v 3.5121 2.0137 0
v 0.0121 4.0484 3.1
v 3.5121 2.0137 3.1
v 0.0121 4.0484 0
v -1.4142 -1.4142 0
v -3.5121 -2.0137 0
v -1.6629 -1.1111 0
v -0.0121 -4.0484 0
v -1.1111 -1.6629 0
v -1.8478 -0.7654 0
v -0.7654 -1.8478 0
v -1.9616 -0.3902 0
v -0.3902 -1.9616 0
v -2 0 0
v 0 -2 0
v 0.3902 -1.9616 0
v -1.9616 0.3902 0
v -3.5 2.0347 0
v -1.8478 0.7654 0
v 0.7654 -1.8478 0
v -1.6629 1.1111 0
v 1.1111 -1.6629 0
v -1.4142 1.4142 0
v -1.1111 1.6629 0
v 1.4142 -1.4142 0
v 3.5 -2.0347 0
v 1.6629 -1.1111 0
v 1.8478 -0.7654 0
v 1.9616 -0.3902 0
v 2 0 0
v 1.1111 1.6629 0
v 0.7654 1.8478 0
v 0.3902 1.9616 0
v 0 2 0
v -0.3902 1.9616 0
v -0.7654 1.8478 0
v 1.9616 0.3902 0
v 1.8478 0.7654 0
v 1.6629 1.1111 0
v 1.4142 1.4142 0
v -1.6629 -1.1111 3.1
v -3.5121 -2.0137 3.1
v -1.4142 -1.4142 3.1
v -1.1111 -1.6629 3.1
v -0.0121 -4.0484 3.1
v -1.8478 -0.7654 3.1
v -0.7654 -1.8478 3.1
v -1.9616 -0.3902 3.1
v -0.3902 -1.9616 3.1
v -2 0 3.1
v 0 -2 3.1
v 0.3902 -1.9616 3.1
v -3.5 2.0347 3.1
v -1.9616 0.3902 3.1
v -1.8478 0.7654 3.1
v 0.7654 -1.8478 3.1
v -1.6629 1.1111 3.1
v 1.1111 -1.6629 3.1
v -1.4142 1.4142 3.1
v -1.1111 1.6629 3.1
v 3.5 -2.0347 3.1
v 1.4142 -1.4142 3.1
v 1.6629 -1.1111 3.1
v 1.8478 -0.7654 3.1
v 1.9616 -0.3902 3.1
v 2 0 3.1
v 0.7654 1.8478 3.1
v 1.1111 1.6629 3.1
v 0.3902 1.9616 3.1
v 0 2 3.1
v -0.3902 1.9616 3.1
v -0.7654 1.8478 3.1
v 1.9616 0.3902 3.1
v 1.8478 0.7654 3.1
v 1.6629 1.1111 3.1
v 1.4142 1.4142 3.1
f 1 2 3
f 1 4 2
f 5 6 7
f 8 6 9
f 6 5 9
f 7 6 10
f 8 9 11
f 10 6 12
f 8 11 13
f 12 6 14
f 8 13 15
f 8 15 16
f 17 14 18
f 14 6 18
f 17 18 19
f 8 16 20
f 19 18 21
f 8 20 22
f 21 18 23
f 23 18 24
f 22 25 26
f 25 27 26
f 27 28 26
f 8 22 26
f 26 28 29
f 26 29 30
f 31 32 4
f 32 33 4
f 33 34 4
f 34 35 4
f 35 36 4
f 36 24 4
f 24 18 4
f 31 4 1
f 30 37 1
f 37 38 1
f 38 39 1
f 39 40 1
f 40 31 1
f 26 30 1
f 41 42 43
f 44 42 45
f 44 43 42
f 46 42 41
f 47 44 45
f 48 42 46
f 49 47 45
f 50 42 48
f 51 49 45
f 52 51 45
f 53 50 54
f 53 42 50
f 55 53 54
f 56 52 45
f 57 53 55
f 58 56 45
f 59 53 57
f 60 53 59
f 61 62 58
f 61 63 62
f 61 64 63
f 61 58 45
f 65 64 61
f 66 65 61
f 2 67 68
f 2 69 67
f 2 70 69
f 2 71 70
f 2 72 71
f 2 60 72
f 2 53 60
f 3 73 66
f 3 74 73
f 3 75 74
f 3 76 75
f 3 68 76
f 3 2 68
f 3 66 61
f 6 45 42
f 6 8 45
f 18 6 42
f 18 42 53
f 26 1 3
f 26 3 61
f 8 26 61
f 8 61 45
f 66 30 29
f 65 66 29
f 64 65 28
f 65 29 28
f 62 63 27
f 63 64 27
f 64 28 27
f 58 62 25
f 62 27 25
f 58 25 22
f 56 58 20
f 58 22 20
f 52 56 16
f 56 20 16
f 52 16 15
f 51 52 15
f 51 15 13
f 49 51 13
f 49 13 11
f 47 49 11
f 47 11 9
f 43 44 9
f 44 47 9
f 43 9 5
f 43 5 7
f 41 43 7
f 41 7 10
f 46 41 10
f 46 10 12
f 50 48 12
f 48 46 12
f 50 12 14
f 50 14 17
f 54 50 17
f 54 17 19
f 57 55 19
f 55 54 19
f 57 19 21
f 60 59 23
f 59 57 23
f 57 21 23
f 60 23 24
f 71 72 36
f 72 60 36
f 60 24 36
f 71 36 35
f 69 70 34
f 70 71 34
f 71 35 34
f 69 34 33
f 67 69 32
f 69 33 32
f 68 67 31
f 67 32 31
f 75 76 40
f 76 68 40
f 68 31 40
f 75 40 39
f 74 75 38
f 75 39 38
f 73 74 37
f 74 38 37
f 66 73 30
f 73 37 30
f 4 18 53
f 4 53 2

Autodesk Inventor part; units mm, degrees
ref_plane "YZ Plane" through (0, 0, 0) normal (1, 0, 0) x (0, 1, 0)
ref_plane "XZ Plane" through (0, 0, 0) normal (0, 1, 0) x (-1, 0, 0)
ref_plane "XY Plane" through (0, 0, 0) normal (0, 0, 1) x (1, 0, 0)
sketch "Sketch1" plane through (0, 0, 0) normal (0, 0, 1) x (1, 0, 0)
  line L0 (3.5, -2.0347) -> (-0.0121, -4.0484)
  line L1 (-0.0121, -4.0484) -> (-3.5121, -2.0137)
  line L2 (-3.5121, -2.0137) -> (-3.5, 2.0347)
  line L3 (-3.5, 2.0347) -> (0.0121, 4.0484)
  line L4 (0.0121, 4.0484) -> (3.5121, 2.0137)
  line L5 (3.5121, 2.0137) -> (3.5, -2.0347)
  circle A0 centre (0, 0) radius 2
  point P0 (3.5, 0)
  dimension "d0" = 3.5
  dimension "d1" = 4
extrude "Extrusion1" add sketch "Sketch1" along normal blind 3.1
properties part number "m4nut"
